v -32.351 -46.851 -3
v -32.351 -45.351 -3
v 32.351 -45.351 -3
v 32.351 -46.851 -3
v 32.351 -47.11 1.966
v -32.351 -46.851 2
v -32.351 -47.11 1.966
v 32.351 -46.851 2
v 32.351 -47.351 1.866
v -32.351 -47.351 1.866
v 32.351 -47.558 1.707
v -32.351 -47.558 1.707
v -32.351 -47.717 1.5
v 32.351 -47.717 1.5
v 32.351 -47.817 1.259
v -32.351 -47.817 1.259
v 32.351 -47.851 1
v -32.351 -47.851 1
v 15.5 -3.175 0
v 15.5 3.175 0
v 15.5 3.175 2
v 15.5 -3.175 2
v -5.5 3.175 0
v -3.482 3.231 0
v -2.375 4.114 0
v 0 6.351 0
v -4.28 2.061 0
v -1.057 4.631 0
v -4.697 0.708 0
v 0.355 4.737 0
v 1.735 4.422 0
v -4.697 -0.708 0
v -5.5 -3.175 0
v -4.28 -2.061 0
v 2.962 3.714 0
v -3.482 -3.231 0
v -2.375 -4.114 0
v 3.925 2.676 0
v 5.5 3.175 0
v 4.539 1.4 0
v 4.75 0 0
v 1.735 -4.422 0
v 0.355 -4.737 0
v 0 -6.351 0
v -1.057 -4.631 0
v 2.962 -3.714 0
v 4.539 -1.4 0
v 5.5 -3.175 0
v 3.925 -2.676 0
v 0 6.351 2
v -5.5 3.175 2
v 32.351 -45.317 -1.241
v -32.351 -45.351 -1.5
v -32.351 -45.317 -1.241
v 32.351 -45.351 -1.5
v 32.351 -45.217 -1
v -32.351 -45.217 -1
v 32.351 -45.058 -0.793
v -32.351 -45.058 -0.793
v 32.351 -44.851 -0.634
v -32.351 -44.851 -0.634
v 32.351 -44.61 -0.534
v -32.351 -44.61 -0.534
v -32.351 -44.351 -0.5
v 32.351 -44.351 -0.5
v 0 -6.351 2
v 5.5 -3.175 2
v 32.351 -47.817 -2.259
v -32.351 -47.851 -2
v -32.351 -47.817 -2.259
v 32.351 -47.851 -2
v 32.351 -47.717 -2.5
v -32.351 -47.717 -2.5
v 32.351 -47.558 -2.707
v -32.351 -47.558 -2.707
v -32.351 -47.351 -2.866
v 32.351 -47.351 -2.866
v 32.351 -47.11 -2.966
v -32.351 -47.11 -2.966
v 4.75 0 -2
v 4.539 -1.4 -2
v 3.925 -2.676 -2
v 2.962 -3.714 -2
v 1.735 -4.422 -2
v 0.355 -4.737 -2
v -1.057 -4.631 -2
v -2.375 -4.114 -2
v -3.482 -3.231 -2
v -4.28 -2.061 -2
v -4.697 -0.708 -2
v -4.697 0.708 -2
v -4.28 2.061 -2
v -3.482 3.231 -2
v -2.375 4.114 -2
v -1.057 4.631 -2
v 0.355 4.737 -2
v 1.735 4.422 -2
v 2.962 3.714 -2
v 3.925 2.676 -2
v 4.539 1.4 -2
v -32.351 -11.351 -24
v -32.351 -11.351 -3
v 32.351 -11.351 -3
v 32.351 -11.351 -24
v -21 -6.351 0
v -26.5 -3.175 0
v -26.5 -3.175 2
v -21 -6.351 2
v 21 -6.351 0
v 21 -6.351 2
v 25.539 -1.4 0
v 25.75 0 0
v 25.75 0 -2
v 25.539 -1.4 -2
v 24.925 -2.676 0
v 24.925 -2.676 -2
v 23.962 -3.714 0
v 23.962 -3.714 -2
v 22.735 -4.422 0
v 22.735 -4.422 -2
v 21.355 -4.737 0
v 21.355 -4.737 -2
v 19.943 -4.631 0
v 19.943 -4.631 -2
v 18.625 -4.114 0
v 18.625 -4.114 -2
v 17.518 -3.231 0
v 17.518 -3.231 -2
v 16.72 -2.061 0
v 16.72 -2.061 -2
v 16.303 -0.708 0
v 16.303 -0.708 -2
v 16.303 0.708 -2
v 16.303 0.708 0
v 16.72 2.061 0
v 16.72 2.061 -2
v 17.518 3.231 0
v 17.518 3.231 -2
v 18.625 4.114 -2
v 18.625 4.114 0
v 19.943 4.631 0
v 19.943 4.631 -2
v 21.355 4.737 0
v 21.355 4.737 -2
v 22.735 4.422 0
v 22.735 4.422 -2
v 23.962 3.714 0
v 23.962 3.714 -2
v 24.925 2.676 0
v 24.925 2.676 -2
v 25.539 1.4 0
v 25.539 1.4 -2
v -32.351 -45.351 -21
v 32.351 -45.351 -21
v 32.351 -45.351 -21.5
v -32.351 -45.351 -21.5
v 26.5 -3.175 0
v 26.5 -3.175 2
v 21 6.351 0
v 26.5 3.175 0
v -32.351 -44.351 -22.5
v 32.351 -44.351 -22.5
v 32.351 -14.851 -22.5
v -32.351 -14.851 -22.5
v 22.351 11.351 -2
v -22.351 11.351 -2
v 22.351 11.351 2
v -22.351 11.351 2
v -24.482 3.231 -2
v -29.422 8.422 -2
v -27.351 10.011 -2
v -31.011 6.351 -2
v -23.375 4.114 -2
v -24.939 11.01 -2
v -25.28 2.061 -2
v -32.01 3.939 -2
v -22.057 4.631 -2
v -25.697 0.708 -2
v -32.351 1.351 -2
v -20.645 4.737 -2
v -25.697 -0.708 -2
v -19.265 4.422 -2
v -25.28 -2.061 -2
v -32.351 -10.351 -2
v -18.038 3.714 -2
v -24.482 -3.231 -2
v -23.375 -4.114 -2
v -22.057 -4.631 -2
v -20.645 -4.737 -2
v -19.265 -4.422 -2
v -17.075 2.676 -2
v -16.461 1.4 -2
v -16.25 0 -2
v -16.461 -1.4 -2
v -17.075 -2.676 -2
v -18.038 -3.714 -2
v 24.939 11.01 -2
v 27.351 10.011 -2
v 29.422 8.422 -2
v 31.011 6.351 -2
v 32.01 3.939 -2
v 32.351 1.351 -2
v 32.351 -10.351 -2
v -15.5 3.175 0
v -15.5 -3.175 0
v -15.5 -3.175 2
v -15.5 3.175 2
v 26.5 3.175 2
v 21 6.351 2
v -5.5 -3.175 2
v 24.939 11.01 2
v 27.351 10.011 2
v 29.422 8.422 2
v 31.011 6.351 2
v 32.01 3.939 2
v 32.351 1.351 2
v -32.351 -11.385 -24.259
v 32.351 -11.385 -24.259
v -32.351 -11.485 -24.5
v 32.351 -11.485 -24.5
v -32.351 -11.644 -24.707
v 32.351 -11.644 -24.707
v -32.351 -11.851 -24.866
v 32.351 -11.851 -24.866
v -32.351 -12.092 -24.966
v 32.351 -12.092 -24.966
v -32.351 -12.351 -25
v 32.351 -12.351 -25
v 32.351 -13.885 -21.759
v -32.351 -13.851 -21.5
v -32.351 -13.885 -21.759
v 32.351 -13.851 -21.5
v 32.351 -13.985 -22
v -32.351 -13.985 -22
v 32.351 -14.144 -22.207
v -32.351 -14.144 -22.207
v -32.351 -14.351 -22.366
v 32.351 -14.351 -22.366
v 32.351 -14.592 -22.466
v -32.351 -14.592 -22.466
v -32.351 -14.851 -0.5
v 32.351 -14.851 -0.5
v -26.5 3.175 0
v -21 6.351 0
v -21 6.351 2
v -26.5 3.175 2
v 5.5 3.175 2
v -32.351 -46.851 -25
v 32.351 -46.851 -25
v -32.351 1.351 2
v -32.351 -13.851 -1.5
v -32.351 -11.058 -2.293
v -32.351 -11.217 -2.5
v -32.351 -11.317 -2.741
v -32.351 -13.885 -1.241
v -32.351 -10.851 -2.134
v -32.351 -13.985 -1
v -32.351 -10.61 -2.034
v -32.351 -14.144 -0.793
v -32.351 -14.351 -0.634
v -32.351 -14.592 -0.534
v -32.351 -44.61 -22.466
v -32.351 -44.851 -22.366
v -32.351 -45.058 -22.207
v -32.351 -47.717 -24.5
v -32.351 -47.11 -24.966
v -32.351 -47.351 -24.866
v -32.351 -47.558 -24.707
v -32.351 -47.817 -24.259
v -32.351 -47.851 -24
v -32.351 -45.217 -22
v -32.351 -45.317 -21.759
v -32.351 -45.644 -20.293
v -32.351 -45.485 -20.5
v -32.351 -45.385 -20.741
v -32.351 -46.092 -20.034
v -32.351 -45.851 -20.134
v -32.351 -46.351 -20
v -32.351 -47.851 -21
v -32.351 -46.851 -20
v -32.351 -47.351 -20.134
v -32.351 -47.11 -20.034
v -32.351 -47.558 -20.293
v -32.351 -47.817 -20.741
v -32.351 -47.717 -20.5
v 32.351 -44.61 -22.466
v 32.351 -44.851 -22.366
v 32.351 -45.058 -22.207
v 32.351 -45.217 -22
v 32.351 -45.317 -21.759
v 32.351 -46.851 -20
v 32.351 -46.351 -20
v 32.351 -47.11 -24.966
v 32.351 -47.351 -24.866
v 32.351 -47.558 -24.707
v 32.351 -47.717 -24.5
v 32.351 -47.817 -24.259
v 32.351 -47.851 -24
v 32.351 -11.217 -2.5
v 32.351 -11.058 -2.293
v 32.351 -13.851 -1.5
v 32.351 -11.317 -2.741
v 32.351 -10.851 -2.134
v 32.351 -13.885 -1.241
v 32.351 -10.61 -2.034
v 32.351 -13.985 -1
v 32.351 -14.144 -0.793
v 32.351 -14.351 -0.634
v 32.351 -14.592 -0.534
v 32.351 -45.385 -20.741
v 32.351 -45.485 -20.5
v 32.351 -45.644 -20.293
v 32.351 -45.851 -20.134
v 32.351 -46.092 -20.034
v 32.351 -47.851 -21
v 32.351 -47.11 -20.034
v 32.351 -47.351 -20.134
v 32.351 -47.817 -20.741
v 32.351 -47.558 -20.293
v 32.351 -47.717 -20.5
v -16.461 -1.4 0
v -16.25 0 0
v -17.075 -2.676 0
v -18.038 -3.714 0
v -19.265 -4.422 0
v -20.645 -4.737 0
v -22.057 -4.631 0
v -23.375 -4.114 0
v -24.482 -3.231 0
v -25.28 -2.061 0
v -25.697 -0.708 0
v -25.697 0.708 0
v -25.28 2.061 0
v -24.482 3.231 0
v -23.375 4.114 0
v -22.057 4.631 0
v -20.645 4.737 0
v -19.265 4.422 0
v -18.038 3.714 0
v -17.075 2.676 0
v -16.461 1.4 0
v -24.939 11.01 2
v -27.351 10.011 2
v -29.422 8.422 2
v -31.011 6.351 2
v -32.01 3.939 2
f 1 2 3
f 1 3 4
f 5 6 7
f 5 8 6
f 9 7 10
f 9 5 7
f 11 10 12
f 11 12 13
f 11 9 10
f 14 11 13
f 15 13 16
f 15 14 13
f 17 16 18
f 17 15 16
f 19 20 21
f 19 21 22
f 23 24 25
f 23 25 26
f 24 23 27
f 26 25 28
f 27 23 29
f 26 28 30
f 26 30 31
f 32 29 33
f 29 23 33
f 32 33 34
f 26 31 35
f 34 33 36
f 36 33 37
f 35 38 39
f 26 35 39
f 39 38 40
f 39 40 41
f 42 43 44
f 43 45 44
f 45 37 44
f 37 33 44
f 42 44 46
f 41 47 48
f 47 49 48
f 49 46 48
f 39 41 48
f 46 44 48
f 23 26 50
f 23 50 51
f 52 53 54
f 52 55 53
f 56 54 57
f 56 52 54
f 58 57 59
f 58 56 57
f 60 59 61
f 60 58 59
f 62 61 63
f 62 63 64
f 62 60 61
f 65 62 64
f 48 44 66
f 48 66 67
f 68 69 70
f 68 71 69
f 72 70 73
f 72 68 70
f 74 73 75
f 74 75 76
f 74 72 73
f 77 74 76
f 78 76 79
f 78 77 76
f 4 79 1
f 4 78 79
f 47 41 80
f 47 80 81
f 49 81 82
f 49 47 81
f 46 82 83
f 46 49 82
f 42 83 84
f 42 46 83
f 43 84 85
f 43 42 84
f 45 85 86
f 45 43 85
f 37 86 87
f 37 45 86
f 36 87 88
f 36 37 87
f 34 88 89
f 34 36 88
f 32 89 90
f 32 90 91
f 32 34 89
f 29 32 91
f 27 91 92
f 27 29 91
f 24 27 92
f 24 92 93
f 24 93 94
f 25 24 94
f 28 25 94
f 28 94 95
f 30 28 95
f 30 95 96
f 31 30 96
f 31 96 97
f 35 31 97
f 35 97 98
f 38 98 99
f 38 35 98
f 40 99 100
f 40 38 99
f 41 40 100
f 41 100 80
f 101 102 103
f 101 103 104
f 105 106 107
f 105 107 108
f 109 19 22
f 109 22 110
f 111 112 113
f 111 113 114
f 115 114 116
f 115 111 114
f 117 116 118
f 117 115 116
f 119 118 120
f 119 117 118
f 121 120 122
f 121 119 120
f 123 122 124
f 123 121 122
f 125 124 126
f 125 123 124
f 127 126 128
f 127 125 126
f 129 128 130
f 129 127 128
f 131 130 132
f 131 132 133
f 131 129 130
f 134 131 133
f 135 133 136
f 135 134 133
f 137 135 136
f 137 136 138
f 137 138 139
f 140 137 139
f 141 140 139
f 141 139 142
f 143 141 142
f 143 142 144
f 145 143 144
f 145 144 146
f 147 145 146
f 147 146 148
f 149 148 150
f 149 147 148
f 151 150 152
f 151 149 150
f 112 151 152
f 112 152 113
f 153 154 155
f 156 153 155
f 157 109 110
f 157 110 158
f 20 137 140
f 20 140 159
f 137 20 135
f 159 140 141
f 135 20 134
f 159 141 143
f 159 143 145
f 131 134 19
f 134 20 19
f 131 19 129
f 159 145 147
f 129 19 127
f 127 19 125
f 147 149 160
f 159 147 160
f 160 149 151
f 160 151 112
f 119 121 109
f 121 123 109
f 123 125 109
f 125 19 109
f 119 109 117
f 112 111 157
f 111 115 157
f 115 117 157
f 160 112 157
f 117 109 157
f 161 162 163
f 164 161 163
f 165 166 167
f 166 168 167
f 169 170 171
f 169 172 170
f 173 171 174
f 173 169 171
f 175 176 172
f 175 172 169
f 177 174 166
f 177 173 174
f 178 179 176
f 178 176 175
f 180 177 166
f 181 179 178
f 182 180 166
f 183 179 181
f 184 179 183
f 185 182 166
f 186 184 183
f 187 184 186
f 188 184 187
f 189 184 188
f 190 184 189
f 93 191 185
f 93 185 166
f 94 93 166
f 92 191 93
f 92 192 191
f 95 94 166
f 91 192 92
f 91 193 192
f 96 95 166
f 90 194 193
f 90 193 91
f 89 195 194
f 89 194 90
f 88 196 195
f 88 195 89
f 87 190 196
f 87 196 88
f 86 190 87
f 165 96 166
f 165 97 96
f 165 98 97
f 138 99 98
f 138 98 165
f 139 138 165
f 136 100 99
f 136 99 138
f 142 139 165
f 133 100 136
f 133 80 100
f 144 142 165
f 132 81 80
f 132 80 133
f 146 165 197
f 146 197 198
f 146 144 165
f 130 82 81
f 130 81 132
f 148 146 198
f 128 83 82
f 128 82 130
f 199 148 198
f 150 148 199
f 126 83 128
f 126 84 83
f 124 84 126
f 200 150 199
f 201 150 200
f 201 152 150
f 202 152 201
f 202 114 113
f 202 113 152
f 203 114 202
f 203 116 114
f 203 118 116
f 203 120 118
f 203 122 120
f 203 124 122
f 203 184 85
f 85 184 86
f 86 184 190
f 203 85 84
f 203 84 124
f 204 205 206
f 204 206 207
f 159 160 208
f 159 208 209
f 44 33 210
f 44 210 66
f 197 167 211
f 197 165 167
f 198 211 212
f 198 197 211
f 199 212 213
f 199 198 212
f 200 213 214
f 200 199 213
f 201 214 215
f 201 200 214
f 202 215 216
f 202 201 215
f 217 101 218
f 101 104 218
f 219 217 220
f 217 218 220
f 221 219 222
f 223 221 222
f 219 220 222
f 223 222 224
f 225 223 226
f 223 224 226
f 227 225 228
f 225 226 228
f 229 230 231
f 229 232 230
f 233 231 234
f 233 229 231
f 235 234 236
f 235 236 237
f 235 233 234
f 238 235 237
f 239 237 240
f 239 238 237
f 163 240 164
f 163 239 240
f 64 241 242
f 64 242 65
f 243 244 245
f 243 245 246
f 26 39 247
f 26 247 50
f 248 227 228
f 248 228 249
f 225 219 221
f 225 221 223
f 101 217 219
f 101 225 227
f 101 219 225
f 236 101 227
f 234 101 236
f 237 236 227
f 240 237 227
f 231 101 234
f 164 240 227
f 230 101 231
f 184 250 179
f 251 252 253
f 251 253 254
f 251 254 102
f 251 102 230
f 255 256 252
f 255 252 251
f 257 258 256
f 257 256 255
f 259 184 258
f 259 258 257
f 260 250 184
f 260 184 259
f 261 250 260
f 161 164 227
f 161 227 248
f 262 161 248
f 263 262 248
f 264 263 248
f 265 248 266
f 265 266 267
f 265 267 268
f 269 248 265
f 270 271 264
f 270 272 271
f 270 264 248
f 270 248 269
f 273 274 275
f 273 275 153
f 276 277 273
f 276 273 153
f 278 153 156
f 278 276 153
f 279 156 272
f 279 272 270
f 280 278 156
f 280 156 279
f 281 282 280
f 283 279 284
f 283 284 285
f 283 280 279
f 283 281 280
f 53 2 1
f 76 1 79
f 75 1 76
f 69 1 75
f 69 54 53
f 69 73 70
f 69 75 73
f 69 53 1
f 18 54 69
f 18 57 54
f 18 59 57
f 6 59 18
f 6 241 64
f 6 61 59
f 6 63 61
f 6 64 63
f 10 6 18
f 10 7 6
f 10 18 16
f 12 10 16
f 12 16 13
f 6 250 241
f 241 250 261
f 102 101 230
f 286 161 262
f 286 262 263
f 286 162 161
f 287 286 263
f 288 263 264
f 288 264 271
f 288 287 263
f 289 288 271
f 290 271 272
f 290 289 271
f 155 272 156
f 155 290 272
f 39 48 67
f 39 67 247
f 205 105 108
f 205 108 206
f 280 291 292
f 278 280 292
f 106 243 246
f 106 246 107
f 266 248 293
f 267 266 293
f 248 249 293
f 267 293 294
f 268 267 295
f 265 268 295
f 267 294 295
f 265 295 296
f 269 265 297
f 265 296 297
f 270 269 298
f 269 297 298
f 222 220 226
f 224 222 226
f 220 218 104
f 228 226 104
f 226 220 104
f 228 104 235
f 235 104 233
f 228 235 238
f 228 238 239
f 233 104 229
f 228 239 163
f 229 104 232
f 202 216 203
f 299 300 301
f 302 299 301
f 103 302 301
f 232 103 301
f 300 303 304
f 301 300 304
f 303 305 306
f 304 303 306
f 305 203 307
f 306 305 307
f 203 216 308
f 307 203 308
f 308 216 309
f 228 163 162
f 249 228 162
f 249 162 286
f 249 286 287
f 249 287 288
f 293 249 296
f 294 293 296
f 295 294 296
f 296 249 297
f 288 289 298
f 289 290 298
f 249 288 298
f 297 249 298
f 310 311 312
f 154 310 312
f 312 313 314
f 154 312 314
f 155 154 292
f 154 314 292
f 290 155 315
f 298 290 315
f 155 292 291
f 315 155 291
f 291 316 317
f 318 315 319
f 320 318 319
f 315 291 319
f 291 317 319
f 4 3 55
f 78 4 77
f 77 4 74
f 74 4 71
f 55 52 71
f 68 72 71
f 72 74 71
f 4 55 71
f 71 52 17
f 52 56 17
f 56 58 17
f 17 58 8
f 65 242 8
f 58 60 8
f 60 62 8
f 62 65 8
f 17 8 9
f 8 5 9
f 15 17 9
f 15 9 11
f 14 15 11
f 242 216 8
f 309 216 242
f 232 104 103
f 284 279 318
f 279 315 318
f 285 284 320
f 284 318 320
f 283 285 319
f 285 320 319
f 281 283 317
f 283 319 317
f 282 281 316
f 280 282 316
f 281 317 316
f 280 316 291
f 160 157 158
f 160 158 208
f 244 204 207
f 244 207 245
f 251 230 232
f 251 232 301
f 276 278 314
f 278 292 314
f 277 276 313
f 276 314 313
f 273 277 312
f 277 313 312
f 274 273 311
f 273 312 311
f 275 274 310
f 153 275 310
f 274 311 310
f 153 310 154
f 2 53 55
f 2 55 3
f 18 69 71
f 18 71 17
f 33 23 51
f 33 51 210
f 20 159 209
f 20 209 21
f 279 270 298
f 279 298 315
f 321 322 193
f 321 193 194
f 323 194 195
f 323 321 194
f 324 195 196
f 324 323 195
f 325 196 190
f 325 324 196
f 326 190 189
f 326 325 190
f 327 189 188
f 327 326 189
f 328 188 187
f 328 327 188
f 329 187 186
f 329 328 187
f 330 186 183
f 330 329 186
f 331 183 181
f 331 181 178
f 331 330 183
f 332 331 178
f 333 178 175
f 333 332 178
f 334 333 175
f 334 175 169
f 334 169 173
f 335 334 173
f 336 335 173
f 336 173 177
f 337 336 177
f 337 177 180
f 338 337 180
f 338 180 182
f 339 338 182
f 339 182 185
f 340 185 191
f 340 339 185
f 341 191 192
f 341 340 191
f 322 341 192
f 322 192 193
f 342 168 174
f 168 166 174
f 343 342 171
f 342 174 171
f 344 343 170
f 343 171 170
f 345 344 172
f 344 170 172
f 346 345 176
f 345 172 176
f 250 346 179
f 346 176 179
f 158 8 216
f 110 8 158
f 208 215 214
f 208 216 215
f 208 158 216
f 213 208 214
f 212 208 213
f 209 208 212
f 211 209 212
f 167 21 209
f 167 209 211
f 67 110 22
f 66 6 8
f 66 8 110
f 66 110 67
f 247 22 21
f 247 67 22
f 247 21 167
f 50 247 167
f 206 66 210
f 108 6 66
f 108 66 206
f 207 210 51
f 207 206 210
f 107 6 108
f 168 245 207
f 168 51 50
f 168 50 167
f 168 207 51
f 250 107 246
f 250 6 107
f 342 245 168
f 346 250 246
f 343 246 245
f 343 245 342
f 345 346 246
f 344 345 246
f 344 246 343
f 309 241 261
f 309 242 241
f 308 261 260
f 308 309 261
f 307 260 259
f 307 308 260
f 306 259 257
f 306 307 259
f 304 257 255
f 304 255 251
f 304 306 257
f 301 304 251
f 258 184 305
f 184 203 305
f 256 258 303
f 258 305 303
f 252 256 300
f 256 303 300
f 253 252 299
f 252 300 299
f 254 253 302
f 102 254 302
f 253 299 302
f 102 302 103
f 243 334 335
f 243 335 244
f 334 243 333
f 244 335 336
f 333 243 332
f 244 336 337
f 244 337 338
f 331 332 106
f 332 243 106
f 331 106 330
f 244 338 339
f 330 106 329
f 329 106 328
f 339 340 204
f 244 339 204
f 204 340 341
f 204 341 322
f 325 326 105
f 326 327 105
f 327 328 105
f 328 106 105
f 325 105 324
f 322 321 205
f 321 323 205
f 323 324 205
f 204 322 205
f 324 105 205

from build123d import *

# Parameters (mm, degrees)
SKETCH_W     = 64.701706
SKETCH_H     = 22.701706
PAD_DEPTH    = 2
SKETCH001_W  = 64.701706
SKETCH001_H  = 22.701706
SKETCH001_R  = 4.75
PAD001_DEPTH = 2
PAD002_DEPTH = 64.701706
FILLET_R     = 10
FILLET001_R  = 1


with BuildPart() as part:
    # Sketch → Pad (new body)
    with BuildSketch(Plane.XY):
        Rectangle(SKETCH_W, SKETCH_H)
        Polygon((0, 6.350853), (-5.5, 3.175426), (-5.5, -3.175426), (0, -6.350853), (5.5, -3.175426), (5.5, 3.175426), align=None, mode=Mode.SUBTRACT)
        Polygon((-21, 6.350853), (-26.5, 3.175426), (-26.5, -3.175426), (-21, -6.350853), (-15.5, -3.175426), (-15.5, 3.175426), align=None, mode=Mode.SUBTRACT)
        Polygon((21, 6.350853), (15.5, 3.175426), (15.5, -3.175426), (21, -6.350853), (26.5, -3.175426), (26.5, 3.175426), align=None, mode=Mode.SUBTRACT)
    extrude(amount=PAD_DEPTH)

    # Sketch001 (on Face23 of Pad) → Pad001 (join)
    with BuildSketch(Plane(origin=(0, 0, 0), x_dir=(1, 0, 0), z_dir=(0, 0, -1))):
        Rectangle(SKETCH001_W, SKETCH001_H)
        Circle(SKETCH001_R, mode=Mode.SUBTRACT)
        with Locations((21, 0)):
            Circle(SKETCH001_R, mode=Mode.SUBTRACT)
        with Locations((-21, 0)):
            Circle(SKETCH001_R, mode=Mode.SUBTRACT)
    extrude(amount=PAD001_DEPTH)

    # Sketch002 (on Face28 of Pad001) → Pad002 (join)
    with BuildSketch(Plane(origin=(-32.350853, 0, 0), x_dir=(0, -1, 0), z_dir=(-1, 0, 0))):
        Polygon((11.350853, 2), (11.350853, -25), (47.850853, -25), (47.850853, -20), (45.350853, -20), (45.350853, -22.5), (13.850853, -22.5), (13.850853, -0.5), (45.350853, -0.5), (45.350853, -3), (47.850853, -3), (47.850853, 2), align=None)
    extrude(amount=-PAD002_DEPTH)

    # Fillet
    fillet_edges = [part.edges().sort_by_distance(p)[0] for p in [
        (32.350853, 11.350853, 0),
        (-32.350853, 11.350853, 0),
    ]]
    fillet(fillet_edges, radius=FILLET_R)

    # Fillet001
    fillet001_edges = [part.edges().sort_by_distance(p)[0] for p in [
        (0, -47.850853, 2),
        (0, -47.850853, -3),
        (0, -45.350853, -20),
        (0, -47.850853, -20),
        (0, -47.850853, -25),
        (0, -13.850853, -22.5),
        (0, -13.850853, -0.5),
        (0, -45.350853, -0.5),
        (0, -45.350853, -22.5),
        (0, -11.350853, -25),
        (0, -11.350853, -2),
    ]]
    fillet(fillet001_edges, radius=FILLET001_R)


solid = part.part
